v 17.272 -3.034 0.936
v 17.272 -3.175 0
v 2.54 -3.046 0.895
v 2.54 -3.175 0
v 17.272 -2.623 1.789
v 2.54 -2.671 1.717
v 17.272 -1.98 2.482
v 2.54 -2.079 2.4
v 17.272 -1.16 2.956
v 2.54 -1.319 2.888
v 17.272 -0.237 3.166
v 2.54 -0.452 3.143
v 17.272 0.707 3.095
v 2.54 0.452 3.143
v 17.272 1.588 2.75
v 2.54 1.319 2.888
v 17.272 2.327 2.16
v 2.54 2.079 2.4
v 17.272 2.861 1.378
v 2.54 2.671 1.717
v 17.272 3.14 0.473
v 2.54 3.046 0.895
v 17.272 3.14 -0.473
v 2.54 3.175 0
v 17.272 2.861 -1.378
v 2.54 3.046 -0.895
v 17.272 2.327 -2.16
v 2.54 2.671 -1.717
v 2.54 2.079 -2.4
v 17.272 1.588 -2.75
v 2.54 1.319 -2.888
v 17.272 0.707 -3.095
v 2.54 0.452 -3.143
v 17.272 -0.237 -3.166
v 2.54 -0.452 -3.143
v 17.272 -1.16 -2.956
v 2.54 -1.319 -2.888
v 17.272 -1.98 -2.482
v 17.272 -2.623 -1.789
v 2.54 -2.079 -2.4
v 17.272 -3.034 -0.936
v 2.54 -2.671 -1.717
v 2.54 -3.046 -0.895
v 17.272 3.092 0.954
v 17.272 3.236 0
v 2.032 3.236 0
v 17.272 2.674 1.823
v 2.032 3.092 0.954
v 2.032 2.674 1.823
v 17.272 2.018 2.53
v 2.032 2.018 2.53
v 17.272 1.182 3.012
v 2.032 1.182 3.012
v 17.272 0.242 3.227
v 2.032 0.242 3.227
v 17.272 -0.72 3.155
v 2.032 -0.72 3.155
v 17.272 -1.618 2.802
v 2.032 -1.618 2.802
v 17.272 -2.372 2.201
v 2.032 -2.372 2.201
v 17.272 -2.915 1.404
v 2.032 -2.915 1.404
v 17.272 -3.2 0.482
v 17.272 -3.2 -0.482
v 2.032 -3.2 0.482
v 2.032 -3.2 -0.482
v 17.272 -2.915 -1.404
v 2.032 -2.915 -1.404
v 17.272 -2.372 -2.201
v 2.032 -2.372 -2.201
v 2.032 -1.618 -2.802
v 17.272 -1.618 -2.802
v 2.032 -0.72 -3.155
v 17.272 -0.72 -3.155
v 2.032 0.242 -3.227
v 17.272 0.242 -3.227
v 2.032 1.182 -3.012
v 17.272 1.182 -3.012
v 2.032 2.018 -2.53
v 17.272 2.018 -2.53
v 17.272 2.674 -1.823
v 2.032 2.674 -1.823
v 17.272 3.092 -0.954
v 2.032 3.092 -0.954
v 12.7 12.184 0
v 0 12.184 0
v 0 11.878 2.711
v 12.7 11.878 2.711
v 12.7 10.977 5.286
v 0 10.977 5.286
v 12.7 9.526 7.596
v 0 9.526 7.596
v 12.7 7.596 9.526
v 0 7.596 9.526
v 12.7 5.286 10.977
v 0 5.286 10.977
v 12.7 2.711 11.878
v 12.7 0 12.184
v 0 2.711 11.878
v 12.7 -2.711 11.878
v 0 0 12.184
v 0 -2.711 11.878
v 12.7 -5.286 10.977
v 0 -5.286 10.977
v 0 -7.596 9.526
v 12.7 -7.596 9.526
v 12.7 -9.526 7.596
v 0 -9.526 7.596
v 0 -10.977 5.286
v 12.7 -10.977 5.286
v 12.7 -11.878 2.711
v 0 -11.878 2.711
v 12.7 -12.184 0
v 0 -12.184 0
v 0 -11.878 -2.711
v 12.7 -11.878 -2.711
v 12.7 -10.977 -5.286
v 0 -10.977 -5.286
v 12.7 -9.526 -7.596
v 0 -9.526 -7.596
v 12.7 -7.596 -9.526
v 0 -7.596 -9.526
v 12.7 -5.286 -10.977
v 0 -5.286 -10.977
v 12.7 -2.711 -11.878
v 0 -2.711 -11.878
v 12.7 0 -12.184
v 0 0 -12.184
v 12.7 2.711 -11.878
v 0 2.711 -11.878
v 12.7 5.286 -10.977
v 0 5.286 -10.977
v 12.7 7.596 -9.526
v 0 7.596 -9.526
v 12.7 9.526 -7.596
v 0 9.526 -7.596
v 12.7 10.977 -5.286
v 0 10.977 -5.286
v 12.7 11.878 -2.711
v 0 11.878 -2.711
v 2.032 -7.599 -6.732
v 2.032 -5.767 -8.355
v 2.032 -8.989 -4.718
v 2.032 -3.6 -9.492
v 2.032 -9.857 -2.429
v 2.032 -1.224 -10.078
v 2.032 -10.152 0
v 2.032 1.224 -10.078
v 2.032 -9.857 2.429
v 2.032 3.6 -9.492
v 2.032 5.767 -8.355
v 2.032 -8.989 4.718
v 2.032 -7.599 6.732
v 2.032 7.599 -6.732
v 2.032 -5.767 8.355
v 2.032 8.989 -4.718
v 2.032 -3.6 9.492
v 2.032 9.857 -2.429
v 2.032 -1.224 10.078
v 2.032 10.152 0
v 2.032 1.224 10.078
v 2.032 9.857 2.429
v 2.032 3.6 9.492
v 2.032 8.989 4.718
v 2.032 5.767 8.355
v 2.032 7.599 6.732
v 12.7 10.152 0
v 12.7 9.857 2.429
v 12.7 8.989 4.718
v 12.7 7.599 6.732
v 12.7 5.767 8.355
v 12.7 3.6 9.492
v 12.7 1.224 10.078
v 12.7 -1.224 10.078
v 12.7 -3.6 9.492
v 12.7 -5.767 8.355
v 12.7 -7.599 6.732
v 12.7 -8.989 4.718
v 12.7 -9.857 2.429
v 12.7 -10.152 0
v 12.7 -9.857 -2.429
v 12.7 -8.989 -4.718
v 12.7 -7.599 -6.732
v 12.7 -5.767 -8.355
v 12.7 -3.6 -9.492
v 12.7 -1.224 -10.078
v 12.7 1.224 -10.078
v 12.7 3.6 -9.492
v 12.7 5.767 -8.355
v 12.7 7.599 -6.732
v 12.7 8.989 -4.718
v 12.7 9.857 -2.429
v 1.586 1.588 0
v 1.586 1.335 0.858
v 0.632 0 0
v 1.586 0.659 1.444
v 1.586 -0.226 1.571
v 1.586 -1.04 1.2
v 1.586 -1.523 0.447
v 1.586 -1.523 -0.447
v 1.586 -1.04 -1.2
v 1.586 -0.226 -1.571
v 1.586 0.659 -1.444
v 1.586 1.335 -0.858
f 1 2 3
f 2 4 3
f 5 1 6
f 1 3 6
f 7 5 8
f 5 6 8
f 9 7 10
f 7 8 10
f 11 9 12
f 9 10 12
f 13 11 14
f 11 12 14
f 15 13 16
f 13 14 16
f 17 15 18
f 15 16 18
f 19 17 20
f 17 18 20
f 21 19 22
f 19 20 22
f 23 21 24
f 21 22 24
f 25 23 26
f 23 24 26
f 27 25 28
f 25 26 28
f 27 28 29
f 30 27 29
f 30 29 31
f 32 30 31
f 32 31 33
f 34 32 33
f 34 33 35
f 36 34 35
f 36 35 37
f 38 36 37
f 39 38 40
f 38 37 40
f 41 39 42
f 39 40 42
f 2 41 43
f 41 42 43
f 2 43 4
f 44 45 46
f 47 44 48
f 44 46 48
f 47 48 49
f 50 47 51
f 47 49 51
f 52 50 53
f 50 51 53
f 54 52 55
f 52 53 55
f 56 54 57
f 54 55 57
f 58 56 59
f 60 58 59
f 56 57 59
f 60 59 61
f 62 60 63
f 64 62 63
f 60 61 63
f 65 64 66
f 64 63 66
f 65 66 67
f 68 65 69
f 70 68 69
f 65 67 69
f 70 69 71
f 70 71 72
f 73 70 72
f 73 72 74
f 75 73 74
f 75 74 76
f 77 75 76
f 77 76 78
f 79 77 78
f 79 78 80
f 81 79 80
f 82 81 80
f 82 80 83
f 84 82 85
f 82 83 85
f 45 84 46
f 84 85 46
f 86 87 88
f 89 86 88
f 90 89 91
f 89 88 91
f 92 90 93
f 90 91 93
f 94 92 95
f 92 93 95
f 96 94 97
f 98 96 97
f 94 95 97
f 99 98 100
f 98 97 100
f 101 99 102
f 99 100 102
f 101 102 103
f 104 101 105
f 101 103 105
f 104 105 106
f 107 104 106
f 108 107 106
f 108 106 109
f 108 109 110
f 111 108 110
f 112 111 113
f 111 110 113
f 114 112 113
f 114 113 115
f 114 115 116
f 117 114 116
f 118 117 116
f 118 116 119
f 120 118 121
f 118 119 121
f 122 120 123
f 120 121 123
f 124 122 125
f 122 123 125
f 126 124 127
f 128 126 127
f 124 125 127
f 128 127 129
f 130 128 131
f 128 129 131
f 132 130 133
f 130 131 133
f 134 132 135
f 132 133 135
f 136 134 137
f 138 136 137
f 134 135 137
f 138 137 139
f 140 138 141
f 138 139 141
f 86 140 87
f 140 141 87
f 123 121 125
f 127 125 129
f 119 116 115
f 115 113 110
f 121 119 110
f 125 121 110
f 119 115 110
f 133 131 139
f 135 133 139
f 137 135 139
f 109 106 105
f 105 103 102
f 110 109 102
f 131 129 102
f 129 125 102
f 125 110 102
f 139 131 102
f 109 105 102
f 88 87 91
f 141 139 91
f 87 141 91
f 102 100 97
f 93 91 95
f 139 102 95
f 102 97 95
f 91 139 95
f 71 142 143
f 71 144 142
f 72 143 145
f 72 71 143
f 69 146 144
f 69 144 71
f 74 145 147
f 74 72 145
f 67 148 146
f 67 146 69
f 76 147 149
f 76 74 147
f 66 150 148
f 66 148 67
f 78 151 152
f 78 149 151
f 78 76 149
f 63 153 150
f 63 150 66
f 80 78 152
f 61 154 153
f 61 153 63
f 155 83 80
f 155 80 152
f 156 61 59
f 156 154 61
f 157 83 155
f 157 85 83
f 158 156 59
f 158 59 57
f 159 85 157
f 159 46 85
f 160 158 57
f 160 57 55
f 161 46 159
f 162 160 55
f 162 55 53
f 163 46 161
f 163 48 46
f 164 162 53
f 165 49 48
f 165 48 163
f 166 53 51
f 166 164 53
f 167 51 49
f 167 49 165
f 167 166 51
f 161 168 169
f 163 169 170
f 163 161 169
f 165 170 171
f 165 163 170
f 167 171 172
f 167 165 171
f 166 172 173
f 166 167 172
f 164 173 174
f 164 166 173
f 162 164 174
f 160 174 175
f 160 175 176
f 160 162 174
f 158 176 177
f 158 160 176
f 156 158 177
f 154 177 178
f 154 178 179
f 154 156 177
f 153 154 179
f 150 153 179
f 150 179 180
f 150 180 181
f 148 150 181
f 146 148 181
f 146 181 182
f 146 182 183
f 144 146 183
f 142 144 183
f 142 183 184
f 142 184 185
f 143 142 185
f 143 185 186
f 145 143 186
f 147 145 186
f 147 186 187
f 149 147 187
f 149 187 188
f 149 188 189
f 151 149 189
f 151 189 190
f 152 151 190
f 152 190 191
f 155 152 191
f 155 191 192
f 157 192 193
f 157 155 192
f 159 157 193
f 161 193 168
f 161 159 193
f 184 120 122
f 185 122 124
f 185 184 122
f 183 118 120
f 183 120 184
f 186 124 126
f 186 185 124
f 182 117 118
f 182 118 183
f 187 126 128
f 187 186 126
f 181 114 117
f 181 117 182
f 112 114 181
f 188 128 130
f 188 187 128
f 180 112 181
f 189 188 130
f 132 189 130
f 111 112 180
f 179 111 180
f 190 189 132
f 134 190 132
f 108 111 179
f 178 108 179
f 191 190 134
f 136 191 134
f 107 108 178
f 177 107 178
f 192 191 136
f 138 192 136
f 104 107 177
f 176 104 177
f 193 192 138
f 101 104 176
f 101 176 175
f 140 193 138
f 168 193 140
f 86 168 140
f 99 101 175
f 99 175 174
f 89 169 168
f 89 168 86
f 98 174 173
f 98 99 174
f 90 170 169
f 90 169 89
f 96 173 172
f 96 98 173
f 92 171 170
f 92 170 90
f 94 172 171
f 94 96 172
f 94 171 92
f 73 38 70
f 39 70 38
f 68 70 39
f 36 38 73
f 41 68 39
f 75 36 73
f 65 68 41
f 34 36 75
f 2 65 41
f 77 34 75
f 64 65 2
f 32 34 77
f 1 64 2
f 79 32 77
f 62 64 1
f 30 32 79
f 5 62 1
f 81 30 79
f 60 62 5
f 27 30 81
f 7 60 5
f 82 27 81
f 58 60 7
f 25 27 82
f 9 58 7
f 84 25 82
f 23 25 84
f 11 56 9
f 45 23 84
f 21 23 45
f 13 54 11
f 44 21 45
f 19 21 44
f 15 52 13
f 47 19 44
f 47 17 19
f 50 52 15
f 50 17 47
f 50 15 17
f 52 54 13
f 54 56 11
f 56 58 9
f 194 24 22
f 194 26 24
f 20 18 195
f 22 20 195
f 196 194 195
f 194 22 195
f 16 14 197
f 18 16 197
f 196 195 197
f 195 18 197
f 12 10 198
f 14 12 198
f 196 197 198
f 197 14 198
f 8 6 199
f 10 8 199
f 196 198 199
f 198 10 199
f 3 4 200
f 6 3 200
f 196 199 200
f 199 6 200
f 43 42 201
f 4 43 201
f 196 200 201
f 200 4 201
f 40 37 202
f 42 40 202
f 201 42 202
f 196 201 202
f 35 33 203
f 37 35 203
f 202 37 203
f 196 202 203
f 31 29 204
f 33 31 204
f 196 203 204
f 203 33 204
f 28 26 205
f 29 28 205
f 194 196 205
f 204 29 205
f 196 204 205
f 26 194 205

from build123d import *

# Parameters (mm, degrees)
F0_R     = 12.1837068699
F1_DEPTH = 12.7
F2_T     = -2.032
F3_R     = 3.2359024919
F4_DEPTH = 15.24
F6_D     = 6.35
F6_DEPTH = 14.732
F6_TIP   = 1.9077324654


with BuildPart() as f1:
    # F0 (on Right) → F1 (new body)
    with BuildSketch(Plane.YZ):
        Circle(F0_R)
    extrude(amount=F1_DEPTH)

    # F2
    f2_openings = [f1.faces().sort_by_distance(p)[0] for p in [
        (12.7, 0, 0),
    ]]
    offset(amount=F2_T, openings=f2_openings)

    # F3 (on face) → F4 (join)
    with BuildSketch(Plane.YZ.offset(2.032)):
        Circle(F3_R)
    extrude(amount=F4_DEPTH)

    # F6
    with Locations(Plane.YZ.offset(17.272)):
        with Locations((0, 0)):
            Hole(F6_D / 2, depth=F6_DEPTH)
            with Locations((0, 0, -(F6_DEPTH + F6_TIP / 2))):  # 118° drill point
                Cone(0, F6_D / 2, F6_TIP, mode=Mode.SUBTRACT)


solid = f1.part
